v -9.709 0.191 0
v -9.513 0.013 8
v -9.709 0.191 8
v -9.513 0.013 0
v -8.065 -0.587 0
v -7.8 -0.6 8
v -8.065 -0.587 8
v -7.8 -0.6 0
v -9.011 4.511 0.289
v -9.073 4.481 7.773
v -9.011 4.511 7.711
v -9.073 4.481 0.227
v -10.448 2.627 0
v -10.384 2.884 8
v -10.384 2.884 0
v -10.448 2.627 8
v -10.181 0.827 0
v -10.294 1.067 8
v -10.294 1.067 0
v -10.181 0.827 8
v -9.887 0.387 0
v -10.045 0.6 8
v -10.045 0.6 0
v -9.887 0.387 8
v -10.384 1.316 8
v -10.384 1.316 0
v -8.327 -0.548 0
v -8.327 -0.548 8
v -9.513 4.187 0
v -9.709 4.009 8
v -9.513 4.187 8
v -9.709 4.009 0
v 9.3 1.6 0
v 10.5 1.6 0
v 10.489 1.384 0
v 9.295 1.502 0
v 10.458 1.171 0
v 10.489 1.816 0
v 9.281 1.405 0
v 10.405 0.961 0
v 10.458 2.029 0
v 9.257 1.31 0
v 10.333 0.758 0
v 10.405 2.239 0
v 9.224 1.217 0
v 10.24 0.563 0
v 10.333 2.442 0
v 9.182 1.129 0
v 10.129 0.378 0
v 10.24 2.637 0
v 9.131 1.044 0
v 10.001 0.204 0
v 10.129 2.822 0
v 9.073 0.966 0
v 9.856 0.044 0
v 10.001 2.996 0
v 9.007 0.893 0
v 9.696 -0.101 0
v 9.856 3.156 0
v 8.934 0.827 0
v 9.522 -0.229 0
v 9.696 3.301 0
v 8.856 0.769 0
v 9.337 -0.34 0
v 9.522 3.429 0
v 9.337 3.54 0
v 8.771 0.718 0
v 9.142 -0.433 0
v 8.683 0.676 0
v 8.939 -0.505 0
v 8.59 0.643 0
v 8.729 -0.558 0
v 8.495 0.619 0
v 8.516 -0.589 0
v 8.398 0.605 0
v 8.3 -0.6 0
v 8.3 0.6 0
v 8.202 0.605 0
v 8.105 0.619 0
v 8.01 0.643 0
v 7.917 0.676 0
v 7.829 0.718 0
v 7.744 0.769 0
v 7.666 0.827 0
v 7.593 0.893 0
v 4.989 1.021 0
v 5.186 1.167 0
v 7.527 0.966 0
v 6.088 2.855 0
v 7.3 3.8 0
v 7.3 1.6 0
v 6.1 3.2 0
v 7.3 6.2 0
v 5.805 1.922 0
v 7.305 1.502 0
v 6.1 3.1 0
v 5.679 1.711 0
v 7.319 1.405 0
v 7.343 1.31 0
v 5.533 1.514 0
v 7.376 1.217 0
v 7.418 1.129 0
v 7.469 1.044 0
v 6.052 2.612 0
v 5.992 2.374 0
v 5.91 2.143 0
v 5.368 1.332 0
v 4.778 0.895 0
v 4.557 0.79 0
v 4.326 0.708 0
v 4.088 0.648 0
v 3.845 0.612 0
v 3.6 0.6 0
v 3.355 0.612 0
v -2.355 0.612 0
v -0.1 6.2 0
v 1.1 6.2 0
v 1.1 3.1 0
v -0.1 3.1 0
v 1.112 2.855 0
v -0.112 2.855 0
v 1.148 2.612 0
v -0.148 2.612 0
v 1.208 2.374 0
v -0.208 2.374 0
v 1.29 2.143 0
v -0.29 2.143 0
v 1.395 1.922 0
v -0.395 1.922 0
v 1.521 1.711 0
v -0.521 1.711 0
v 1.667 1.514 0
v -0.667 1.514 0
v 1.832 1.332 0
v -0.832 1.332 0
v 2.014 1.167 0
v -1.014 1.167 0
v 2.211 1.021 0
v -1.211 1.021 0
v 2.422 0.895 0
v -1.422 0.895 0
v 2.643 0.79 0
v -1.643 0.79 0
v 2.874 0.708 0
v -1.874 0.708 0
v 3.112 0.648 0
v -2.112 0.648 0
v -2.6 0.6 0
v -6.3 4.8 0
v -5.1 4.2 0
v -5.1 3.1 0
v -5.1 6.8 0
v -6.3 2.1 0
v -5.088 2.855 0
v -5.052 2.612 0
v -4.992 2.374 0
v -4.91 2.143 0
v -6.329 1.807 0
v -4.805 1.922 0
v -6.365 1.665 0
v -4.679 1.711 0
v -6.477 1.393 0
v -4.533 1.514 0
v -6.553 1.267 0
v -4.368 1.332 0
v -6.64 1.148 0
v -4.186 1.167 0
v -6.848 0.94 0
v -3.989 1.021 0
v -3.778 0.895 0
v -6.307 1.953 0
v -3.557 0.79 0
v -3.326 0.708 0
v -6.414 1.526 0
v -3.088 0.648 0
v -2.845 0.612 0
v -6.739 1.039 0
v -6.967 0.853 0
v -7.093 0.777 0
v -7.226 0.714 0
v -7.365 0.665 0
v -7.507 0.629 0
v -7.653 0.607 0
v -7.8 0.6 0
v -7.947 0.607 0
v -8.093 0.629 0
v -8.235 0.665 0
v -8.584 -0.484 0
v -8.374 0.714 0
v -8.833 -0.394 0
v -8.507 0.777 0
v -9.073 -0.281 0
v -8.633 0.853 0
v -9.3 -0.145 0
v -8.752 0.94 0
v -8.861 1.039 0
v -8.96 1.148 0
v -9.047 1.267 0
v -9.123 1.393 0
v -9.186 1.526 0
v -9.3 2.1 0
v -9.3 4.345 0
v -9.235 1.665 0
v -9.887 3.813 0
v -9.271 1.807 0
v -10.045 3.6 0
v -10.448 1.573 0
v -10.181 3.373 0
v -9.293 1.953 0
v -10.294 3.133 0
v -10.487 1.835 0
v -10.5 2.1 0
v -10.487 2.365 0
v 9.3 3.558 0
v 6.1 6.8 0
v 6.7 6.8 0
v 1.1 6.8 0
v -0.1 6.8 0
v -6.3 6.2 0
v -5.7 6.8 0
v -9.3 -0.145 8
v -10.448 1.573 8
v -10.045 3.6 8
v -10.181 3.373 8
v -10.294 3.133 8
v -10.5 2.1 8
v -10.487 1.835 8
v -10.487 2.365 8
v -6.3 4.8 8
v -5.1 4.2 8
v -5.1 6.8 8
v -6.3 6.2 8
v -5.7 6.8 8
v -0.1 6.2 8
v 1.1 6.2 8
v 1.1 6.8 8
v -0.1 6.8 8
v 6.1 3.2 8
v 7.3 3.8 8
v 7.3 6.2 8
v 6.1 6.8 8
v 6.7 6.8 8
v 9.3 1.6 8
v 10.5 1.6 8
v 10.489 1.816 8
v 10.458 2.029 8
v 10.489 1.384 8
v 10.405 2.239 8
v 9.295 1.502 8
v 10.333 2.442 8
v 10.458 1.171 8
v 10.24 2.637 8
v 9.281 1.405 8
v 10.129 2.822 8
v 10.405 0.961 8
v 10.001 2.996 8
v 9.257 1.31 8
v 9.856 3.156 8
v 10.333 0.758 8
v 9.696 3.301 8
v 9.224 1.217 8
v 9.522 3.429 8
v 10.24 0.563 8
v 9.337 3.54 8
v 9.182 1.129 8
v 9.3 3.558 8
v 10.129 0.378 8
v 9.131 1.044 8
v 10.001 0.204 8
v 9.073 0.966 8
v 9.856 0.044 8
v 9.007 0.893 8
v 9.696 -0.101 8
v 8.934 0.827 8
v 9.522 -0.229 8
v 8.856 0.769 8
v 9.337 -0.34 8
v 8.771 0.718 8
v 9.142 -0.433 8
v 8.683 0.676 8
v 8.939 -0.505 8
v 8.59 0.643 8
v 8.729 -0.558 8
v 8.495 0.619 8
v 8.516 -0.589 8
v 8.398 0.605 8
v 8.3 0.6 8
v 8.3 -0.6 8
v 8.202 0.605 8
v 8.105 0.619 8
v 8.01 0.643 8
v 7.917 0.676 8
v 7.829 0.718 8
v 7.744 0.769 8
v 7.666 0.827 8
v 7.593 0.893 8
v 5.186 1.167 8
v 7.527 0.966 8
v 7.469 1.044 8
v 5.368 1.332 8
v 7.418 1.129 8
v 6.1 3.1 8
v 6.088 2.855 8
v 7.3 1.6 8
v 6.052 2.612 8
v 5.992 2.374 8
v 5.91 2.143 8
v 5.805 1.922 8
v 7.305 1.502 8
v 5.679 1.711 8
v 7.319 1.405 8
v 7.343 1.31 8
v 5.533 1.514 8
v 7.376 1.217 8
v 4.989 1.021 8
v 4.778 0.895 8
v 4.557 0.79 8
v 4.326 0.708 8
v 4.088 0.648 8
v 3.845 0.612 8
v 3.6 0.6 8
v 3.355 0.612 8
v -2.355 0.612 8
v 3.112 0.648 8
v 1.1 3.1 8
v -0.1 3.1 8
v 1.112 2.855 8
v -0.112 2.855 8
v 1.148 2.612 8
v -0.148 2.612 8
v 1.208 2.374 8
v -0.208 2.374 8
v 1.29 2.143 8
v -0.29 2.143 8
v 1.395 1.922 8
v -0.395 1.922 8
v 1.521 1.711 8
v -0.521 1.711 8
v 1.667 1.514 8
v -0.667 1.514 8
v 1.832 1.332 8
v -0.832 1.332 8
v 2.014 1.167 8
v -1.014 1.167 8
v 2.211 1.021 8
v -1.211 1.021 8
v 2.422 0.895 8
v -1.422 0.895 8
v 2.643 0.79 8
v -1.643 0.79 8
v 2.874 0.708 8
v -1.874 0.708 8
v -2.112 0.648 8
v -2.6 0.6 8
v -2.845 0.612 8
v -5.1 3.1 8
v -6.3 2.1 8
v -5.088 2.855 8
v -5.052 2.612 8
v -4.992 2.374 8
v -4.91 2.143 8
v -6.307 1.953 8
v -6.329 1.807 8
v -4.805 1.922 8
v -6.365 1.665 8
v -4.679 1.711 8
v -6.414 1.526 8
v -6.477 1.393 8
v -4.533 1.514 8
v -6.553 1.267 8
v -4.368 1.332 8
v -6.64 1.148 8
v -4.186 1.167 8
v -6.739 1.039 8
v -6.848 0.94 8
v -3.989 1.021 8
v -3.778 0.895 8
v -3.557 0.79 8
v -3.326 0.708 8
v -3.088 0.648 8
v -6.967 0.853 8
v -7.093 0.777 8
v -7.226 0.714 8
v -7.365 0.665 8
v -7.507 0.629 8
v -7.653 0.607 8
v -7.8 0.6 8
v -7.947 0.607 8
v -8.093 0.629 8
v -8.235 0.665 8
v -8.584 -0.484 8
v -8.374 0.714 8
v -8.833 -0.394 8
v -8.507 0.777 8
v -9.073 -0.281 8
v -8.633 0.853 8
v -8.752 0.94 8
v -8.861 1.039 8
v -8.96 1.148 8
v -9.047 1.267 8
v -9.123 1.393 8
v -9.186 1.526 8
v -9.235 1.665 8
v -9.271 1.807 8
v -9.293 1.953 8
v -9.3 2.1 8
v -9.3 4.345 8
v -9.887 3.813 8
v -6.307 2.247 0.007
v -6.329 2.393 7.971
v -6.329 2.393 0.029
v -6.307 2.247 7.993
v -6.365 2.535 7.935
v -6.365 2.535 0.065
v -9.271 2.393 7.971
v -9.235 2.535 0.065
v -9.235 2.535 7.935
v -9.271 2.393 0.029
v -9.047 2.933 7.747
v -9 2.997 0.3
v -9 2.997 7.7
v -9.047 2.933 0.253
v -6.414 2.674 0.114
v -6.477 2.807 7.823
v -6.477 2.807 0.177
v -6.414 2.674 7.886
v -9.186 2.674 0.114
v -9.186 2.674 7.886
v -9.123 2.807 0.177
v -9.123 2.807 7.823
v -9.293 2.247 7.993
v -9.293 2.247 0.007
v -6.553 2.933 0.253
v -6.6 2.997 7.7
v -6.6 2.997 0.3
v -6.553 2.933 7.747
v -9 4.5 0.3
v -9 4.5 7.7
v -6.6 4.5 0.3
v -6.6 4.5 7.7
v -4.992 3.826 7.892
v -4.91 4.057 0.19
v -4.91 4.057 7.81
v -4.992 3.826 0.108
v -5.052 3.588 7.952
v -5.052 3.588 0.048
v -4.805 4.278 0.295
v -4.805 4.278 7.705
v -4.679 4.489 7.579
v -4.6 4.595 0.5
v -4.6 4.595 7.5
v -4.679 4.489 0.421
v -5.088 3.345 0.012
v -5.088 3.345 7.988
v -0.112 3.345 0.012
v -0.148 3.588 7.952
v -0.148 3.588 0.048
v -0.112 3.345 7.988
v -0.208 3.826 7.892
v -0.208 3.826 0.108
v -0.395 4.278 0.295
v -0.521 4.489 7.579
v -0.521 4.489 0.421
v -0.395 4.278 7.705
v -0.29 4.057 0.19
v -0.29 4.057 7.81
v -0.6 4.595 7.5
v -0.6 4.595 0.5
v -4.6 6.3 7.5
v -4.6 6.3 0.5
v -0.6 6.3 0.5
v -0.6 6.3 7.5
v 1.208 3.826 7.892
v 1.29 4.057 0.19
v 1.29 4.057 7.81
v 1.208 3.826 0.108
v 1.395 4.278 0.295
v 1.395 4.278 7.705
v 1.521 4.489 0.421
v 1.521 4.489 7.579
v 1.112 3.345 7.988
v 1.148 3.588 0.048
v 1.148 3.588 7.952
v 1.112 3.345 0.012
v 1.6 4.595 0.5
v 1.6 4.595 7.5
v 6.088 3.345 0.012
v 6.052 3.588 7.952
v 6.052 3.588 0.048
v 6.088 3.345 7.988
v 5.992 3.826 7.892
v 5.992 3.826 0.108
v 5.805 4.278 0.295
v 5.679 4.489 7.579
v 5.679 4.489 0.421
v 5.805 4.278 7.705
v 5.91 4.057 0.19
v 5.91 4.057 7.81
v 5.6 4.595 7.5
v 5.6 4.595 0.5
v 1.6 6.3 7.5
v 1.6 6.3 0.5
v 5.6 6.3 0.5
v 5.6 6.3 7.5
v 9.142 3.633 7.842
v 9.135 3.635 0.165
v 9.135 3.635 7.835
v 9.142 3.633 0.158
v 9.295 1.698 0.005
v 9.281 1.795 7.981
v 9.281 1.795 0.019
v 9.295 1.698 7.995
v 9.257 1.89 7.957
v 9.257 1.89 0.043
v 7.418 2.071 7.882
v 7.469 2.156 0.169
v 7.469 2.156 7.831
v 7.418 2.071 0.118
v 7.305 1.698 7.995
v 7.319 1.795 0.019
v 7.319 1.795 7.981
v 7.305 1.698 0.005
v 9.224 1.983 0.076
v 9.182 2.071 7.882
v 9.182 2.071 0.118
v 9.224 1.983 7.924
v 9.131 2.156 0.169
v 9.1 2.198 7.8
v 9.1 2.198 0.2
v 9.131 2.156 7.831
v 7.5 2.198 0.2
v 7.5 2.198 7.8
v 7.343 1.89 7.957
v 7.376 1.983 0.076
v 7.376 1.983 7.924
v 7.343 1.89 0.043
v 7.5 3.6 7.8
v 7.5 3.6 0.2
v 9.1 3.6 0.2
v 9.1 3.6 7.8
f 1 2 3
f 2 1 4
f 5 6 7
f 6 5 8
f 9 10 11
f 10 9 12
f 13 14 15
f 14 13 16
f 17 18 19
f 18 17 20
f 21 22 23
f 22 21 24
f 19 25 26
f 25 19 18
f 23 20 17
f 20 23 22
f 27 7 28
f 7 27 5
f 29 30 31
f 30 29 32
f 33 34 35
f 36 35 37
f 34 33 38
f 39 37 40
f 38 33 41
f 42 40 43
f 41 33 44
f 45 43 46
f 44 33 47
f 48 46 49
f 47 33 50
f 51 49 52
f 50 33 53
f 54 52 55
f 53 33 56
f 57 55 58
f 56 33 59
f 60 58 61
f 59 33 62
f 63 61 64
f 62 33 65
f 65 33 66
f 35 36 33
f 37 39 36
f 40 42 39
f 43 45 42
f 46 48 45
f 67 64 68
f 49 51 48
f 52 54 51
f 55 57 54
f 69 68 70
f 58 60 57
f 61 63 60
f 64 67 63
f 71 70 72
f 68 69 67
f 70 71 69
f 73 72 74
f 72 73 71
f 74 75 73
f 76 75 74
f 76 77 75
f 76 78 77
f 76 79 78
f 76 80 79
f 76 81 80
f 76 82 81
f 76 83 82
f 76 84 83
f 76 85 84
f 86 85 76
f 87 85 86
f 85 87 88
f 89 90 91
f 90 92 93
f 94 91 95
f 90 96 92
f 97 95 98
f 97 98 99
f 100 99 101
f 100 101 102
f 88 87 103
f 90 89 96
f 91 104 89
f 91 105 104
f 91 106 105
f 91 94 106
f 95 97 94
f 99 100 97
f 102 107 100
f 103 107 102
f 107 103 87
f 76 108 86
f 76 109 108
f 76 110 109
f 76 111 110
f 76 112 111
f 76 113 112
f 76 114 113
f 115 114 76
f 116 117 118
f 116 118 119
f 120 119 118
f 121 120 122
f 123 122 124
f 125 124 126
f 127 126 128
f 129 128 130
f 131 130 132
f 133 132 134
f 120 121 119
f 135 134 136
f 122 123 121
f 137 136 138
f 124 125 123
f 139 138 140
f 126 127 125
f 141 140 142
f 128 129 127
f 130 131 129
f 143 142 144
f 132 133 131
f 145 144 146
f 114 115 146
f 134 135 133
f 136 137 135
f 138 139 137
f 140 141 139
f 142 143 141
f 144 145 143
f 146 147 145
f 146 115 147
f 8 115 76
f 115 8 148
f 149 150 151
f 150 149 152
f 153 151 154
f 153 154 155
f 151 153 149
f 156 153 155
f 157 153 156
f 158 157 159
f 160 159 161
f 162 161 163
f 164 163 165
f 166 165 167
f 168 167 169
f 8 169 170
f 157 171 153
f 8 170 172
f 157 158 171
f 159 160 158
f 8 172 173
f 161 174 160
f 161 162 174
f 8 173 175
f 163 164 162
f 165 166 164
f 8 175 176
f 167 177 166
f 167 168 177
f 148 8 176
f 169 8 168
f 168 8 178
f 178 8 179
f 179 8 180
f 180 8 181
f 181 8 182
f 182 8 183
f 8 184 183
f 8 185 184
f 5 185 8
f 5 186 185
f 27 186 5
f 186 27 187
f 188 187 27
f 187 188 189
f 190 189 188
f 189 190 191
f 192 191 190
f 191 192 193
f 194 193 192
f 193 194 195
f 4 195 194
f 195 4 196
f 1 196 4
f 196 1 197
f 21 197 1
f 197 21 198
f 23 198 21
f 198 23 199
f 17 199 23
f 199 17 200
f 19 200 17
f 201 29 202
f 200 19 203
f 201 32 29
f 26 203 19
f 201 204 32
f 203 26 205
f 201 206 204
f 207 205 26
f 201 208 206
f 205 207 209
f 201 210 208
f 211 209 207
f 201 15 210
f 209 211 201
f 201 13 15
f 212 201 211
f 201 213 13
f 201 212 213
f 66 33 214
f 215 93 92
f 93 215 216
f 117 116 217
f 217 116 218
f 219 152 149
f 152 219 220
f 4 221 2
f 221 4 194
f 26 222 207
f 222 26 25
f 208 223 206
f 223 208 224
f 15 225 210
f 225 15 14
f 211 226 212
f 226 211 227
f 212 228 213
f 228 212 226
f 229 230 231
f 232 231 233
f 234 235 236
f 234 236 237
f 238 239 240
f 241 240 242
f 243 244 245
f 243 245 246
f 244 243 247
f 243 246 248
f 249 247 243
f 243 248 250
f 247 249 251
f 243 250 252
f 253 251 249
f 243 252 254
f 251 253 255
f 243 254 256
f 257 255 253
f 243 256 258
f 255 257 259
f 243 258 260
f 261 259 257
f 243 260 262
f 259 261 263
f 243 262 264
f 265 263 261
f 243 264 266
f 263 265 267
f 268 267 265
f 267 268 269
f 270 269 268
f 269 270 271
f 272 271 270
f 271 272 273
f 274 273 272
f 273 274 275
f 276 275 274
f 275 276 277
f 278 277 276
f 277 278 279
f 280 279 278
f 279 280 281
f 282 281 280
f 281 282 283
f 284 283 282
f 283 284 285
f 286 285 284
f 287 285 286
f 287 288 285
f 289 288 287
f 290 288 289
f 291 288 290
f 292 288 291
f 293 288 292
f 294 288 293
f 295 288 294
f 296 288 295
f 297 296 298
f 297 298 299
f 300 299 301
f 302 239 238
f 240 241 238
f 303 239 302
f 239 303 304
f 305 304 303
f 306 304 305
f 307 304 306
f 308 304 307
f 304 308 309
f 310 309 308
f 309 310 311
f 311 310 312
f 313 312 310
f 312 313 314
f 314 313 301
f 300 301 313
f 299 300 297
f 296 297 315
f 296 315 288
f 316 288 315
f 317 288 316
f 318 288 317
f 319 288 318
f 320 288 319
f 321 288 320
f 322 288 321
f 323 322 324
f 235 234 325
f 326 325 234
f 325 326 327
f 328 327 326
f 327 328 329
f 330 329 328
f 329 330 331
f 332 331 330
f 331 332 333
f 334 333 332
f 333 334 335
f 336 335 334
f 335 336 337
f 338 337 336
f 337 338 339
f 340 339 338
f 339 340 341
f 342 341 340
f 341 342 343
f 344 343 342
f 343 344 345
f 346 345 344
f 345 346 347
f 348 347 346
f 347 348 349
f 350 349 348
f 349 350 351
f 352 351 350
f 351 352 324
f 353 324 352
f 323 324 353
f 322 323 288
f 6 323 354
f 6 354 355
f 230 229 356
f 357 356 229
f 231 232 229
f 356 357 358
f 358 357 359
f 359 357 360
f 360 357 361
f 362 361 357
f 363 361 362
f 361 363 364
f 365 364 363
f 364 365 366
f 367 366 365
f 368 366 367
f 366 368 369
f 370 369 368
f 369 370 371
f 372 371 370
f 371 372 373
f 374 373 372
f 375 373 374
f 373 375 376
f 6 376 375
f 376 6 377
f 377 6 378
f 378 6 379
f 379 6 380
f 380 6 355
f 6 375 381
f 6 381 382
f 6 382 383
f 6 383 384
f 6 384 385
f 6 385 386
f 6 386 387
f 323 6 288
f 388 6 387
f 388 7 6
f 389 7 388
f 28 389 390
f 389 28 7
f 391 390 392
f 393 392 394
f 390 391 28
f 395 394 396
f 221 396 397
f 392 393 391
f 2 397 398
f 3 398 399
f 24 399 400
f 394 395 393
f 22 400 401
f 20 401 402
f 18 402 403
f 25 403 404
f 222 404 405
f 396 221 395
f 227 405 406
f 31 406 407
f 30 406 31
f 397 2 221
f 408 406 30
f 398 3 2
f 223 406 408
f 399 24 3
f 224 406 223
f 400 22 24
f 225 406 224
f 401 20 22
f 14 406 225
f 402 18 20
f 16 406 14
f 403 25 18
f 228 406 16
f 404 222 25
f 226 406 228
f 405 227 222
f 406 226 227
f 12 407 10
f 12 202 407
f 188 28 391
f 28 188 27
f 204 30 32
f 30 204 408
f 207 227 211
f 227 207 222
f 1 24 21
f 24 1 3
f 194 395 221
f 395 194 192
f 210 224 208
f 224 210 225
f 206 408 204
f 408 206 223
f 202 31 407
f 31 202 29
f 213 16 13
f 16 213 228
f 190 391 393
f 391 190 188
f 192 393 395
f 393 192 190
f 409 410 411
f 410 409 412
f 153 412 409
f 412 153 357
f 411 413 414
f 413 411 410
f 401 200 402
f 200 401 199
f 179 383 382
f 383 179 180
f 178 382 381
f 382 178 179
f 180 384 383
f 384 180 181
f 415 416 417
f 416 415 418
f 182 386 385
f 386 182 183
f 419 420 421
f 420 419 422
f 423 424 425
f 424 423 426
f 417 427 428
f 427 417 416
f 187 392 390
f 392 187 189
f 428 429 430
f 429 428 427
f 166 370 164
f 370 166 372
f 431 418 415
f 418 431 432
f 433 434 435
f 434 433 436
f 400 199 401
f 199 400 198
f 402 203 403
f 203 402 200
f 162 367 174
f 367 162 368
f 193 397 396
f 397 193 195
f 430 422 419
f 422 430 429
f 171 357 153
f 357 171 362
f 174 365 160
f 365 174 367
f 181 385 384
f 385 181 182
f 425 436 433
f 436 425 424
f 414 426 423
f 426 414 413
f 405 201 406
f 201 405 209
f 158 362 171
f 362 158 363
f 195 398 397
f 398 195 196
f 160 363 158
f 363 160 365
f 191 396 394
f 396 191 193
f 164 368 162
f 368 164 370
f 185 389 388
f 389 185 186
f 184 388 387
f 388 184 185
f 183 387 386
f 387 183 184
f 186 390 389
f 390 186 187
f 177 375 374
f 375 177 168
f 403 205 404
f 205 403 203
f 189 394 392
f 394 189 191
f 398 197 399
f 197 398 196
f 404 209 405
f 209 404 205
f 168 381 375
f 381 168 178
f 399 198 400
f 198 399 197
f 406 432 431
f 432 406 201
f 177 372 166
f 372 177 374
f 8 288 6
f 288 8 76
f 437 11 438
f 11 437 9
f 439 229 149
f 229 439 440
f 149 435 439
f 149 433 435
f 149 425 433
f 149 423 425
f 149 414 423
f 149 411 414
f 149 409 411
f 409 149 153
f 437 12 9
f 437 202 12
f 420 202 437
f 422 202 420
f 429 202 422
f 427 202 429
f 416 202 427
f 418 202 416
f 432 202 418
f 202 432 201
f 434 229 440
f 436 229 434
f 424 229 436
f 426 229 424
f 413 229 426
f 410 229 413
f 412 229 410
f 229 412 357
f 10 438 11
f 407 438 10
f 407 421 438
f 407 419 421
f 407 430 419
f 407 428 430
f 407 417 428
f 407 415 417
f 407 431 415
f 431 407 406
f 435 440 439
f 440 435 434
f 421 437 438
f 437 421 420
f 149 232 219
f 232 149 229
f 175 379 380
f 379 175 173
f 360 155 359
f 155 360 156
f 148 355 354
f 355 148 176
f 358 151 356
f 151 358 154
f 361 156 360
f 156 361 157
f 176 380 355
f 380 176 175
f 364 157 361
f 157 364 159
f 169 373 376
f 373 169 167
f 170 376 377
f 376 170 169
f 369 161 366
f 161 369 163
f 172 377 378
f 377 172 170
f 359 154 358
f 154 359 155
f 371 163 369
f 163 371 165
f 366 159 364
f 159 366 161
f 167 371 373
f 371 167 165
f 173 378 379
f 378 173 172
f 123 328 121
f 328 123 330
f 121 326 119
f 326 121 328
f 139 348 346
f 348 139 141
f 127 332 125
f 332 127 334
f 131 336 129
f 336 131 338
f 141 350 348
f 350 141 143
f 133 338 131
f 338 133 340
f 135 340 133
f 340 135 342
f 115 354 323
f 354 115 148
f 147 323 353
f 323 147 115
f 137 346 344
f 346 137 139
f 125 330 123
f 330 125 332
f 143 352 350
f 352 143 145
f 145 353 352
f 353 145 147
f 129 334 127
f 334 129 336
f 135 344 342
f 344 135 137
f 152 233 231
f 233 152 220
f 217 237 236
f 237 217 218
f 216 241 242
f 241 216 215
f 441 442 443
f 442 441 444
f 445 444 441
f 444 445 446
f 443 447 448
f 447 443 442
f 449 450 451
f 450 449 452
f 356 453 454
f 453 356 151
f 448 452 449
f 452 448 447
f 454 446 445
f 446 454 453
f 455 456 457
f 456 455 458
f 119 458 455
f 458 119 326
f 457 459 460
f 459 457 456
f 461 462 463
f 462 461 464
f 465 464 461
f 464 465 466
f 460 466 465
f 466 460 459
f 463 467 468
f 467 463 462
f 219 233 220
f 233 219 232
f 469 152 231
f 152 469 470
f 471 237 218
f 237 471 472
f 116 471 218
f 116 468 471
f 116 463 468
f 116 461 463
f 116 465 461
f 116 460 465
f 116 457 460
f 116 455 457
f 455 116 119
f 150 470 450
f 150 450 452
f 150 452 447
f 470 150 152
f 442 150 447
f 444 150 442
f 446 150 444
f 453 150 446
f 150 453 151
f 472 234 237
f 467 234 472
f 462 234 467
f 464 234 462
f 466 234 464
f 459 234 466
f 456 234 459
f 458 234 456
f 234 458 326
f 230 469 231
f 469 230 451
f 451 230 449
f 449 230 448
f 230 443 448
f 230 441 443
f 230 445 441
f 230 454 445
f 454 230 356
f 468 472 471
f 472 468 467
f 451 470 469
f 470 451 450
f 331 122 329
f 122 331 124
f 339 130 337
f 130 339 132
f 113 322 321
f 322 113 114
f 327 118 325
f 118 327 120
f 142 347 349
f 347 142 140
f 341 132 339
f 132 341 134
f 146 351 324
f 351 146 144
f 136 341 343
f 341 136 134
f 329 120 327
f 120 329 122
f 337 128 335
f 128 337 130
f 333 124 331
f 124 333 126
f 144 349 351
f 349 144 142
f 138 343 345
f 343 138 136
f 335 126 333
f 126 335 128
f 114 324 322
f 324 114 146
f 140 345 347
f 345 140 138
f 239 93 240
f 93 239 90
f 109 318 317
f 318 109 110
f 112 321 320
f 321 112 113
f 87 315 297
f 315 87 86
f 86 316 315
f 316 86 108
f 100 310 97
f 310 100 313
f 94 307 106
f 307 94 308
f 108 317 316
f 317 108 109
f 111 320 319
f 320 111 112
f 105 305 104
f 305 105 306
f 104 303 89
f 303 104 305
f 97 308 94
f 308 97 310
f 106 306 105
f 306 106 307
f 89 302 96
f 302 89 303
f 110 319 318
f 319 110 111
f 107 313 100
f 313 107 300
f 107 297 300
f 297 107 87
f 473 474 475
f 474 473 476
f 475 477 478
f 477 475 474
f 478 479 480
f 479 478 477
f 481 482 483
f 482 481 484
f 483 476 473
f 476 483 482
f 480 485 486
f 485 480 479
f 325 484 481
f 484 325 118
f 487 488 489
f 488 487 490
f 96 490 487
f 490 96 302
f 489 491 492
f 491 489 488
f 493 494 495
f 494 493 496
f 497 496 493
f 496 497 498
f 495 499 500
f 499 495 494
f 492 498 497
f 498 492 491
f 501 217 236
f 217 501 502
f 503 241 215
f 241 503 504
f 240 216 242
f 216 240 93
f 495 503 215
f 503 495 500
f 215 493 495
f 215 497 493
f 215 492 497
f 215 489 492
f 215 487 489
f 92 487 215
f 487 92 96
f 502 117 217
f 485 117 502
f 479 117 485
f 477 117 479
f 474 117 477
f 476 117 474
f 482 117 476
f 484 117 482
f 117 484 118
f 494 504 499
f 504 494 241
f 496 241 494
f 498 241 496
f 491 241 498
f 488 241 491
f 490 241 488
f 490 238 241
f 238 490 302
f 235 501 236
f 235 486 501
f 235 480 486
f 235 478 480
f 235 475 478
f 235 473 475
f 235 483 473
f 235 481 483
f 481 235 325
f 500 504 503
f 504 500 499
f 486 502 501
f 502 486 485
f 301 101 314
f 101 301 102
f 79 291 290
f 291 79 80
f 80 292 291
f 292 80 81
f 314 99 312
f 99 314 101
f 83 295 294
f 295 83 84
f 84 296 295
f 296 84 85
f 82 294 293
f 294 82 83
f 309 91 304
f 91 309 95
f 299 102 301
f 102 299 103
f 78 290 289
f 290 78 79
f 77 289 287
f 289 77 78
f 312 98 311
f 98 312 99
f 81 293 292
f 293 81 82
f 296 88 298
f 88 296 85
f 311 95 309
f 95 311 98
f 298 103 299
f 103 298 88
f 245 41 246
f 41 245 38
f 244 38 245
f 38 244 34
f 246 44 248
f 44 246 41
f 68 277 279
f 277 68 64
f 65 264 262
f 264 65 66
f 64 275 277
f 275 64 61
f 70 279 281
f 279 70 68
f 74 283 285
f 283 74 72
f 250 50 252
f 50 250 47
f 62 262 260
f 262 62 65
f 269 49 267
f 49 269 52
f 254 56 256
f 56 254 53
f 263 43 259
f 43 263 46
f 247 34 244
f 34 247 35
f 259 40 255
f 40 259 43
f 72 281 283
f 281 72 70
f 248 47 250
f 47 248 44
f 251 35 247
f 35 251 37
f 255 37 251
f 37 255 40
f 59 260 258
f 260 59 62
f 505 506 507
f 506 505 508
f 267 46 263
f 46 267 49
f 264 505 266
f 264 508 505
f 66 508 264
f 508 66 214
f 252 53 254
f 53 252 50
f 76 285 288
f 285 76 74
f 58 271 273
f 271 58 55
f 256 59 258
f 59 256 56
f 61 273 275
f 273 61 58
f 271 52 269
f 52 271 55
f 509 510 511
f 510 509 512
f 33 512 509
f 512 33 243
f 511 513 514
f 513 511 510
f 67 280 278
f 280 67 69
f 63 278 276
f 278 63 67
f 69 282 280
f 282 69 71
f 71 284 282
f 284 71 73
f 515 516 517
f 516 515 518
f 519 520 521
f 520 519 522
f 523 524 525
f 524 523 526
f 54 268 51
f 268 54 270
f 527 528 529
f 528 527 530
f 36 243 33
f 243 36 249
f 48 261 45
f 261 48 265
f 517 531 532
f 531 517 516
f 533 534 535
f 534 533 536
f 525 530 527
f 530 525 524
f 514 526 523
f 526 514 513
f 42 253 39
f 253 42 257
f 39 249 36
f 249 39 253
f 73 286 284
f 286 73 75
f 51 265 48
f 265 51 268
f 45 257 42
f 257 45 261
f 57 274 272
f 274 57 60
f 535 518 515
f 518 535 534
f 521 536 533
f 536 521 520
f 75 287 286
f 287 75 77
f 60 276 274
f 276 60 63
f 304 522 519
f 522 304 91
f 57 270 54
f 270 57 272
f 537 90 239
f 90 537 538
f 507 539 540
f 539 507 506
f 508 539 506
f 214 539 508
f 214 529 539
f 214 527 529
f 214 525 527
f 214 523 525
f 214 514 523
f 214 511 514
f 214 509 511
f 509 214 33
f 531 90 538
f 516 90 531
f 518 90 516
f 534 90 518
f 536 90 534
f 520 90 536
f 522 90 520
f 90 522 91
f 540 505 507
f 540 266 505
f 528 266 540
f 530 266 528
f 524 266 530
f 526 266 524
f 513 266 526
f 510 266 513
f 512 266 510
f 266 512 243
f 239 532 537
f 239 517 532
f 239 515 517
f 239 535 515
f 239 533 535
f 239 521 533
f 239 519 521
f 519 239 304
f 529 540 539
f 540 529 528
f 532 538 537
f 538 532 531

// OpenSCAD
include <../utp-cable-organizer.scad>

// Example A2: Non-uniform length cable holder
settings_cables_dia = [[3,5,5,2]];
settings_uniform_width = false;
